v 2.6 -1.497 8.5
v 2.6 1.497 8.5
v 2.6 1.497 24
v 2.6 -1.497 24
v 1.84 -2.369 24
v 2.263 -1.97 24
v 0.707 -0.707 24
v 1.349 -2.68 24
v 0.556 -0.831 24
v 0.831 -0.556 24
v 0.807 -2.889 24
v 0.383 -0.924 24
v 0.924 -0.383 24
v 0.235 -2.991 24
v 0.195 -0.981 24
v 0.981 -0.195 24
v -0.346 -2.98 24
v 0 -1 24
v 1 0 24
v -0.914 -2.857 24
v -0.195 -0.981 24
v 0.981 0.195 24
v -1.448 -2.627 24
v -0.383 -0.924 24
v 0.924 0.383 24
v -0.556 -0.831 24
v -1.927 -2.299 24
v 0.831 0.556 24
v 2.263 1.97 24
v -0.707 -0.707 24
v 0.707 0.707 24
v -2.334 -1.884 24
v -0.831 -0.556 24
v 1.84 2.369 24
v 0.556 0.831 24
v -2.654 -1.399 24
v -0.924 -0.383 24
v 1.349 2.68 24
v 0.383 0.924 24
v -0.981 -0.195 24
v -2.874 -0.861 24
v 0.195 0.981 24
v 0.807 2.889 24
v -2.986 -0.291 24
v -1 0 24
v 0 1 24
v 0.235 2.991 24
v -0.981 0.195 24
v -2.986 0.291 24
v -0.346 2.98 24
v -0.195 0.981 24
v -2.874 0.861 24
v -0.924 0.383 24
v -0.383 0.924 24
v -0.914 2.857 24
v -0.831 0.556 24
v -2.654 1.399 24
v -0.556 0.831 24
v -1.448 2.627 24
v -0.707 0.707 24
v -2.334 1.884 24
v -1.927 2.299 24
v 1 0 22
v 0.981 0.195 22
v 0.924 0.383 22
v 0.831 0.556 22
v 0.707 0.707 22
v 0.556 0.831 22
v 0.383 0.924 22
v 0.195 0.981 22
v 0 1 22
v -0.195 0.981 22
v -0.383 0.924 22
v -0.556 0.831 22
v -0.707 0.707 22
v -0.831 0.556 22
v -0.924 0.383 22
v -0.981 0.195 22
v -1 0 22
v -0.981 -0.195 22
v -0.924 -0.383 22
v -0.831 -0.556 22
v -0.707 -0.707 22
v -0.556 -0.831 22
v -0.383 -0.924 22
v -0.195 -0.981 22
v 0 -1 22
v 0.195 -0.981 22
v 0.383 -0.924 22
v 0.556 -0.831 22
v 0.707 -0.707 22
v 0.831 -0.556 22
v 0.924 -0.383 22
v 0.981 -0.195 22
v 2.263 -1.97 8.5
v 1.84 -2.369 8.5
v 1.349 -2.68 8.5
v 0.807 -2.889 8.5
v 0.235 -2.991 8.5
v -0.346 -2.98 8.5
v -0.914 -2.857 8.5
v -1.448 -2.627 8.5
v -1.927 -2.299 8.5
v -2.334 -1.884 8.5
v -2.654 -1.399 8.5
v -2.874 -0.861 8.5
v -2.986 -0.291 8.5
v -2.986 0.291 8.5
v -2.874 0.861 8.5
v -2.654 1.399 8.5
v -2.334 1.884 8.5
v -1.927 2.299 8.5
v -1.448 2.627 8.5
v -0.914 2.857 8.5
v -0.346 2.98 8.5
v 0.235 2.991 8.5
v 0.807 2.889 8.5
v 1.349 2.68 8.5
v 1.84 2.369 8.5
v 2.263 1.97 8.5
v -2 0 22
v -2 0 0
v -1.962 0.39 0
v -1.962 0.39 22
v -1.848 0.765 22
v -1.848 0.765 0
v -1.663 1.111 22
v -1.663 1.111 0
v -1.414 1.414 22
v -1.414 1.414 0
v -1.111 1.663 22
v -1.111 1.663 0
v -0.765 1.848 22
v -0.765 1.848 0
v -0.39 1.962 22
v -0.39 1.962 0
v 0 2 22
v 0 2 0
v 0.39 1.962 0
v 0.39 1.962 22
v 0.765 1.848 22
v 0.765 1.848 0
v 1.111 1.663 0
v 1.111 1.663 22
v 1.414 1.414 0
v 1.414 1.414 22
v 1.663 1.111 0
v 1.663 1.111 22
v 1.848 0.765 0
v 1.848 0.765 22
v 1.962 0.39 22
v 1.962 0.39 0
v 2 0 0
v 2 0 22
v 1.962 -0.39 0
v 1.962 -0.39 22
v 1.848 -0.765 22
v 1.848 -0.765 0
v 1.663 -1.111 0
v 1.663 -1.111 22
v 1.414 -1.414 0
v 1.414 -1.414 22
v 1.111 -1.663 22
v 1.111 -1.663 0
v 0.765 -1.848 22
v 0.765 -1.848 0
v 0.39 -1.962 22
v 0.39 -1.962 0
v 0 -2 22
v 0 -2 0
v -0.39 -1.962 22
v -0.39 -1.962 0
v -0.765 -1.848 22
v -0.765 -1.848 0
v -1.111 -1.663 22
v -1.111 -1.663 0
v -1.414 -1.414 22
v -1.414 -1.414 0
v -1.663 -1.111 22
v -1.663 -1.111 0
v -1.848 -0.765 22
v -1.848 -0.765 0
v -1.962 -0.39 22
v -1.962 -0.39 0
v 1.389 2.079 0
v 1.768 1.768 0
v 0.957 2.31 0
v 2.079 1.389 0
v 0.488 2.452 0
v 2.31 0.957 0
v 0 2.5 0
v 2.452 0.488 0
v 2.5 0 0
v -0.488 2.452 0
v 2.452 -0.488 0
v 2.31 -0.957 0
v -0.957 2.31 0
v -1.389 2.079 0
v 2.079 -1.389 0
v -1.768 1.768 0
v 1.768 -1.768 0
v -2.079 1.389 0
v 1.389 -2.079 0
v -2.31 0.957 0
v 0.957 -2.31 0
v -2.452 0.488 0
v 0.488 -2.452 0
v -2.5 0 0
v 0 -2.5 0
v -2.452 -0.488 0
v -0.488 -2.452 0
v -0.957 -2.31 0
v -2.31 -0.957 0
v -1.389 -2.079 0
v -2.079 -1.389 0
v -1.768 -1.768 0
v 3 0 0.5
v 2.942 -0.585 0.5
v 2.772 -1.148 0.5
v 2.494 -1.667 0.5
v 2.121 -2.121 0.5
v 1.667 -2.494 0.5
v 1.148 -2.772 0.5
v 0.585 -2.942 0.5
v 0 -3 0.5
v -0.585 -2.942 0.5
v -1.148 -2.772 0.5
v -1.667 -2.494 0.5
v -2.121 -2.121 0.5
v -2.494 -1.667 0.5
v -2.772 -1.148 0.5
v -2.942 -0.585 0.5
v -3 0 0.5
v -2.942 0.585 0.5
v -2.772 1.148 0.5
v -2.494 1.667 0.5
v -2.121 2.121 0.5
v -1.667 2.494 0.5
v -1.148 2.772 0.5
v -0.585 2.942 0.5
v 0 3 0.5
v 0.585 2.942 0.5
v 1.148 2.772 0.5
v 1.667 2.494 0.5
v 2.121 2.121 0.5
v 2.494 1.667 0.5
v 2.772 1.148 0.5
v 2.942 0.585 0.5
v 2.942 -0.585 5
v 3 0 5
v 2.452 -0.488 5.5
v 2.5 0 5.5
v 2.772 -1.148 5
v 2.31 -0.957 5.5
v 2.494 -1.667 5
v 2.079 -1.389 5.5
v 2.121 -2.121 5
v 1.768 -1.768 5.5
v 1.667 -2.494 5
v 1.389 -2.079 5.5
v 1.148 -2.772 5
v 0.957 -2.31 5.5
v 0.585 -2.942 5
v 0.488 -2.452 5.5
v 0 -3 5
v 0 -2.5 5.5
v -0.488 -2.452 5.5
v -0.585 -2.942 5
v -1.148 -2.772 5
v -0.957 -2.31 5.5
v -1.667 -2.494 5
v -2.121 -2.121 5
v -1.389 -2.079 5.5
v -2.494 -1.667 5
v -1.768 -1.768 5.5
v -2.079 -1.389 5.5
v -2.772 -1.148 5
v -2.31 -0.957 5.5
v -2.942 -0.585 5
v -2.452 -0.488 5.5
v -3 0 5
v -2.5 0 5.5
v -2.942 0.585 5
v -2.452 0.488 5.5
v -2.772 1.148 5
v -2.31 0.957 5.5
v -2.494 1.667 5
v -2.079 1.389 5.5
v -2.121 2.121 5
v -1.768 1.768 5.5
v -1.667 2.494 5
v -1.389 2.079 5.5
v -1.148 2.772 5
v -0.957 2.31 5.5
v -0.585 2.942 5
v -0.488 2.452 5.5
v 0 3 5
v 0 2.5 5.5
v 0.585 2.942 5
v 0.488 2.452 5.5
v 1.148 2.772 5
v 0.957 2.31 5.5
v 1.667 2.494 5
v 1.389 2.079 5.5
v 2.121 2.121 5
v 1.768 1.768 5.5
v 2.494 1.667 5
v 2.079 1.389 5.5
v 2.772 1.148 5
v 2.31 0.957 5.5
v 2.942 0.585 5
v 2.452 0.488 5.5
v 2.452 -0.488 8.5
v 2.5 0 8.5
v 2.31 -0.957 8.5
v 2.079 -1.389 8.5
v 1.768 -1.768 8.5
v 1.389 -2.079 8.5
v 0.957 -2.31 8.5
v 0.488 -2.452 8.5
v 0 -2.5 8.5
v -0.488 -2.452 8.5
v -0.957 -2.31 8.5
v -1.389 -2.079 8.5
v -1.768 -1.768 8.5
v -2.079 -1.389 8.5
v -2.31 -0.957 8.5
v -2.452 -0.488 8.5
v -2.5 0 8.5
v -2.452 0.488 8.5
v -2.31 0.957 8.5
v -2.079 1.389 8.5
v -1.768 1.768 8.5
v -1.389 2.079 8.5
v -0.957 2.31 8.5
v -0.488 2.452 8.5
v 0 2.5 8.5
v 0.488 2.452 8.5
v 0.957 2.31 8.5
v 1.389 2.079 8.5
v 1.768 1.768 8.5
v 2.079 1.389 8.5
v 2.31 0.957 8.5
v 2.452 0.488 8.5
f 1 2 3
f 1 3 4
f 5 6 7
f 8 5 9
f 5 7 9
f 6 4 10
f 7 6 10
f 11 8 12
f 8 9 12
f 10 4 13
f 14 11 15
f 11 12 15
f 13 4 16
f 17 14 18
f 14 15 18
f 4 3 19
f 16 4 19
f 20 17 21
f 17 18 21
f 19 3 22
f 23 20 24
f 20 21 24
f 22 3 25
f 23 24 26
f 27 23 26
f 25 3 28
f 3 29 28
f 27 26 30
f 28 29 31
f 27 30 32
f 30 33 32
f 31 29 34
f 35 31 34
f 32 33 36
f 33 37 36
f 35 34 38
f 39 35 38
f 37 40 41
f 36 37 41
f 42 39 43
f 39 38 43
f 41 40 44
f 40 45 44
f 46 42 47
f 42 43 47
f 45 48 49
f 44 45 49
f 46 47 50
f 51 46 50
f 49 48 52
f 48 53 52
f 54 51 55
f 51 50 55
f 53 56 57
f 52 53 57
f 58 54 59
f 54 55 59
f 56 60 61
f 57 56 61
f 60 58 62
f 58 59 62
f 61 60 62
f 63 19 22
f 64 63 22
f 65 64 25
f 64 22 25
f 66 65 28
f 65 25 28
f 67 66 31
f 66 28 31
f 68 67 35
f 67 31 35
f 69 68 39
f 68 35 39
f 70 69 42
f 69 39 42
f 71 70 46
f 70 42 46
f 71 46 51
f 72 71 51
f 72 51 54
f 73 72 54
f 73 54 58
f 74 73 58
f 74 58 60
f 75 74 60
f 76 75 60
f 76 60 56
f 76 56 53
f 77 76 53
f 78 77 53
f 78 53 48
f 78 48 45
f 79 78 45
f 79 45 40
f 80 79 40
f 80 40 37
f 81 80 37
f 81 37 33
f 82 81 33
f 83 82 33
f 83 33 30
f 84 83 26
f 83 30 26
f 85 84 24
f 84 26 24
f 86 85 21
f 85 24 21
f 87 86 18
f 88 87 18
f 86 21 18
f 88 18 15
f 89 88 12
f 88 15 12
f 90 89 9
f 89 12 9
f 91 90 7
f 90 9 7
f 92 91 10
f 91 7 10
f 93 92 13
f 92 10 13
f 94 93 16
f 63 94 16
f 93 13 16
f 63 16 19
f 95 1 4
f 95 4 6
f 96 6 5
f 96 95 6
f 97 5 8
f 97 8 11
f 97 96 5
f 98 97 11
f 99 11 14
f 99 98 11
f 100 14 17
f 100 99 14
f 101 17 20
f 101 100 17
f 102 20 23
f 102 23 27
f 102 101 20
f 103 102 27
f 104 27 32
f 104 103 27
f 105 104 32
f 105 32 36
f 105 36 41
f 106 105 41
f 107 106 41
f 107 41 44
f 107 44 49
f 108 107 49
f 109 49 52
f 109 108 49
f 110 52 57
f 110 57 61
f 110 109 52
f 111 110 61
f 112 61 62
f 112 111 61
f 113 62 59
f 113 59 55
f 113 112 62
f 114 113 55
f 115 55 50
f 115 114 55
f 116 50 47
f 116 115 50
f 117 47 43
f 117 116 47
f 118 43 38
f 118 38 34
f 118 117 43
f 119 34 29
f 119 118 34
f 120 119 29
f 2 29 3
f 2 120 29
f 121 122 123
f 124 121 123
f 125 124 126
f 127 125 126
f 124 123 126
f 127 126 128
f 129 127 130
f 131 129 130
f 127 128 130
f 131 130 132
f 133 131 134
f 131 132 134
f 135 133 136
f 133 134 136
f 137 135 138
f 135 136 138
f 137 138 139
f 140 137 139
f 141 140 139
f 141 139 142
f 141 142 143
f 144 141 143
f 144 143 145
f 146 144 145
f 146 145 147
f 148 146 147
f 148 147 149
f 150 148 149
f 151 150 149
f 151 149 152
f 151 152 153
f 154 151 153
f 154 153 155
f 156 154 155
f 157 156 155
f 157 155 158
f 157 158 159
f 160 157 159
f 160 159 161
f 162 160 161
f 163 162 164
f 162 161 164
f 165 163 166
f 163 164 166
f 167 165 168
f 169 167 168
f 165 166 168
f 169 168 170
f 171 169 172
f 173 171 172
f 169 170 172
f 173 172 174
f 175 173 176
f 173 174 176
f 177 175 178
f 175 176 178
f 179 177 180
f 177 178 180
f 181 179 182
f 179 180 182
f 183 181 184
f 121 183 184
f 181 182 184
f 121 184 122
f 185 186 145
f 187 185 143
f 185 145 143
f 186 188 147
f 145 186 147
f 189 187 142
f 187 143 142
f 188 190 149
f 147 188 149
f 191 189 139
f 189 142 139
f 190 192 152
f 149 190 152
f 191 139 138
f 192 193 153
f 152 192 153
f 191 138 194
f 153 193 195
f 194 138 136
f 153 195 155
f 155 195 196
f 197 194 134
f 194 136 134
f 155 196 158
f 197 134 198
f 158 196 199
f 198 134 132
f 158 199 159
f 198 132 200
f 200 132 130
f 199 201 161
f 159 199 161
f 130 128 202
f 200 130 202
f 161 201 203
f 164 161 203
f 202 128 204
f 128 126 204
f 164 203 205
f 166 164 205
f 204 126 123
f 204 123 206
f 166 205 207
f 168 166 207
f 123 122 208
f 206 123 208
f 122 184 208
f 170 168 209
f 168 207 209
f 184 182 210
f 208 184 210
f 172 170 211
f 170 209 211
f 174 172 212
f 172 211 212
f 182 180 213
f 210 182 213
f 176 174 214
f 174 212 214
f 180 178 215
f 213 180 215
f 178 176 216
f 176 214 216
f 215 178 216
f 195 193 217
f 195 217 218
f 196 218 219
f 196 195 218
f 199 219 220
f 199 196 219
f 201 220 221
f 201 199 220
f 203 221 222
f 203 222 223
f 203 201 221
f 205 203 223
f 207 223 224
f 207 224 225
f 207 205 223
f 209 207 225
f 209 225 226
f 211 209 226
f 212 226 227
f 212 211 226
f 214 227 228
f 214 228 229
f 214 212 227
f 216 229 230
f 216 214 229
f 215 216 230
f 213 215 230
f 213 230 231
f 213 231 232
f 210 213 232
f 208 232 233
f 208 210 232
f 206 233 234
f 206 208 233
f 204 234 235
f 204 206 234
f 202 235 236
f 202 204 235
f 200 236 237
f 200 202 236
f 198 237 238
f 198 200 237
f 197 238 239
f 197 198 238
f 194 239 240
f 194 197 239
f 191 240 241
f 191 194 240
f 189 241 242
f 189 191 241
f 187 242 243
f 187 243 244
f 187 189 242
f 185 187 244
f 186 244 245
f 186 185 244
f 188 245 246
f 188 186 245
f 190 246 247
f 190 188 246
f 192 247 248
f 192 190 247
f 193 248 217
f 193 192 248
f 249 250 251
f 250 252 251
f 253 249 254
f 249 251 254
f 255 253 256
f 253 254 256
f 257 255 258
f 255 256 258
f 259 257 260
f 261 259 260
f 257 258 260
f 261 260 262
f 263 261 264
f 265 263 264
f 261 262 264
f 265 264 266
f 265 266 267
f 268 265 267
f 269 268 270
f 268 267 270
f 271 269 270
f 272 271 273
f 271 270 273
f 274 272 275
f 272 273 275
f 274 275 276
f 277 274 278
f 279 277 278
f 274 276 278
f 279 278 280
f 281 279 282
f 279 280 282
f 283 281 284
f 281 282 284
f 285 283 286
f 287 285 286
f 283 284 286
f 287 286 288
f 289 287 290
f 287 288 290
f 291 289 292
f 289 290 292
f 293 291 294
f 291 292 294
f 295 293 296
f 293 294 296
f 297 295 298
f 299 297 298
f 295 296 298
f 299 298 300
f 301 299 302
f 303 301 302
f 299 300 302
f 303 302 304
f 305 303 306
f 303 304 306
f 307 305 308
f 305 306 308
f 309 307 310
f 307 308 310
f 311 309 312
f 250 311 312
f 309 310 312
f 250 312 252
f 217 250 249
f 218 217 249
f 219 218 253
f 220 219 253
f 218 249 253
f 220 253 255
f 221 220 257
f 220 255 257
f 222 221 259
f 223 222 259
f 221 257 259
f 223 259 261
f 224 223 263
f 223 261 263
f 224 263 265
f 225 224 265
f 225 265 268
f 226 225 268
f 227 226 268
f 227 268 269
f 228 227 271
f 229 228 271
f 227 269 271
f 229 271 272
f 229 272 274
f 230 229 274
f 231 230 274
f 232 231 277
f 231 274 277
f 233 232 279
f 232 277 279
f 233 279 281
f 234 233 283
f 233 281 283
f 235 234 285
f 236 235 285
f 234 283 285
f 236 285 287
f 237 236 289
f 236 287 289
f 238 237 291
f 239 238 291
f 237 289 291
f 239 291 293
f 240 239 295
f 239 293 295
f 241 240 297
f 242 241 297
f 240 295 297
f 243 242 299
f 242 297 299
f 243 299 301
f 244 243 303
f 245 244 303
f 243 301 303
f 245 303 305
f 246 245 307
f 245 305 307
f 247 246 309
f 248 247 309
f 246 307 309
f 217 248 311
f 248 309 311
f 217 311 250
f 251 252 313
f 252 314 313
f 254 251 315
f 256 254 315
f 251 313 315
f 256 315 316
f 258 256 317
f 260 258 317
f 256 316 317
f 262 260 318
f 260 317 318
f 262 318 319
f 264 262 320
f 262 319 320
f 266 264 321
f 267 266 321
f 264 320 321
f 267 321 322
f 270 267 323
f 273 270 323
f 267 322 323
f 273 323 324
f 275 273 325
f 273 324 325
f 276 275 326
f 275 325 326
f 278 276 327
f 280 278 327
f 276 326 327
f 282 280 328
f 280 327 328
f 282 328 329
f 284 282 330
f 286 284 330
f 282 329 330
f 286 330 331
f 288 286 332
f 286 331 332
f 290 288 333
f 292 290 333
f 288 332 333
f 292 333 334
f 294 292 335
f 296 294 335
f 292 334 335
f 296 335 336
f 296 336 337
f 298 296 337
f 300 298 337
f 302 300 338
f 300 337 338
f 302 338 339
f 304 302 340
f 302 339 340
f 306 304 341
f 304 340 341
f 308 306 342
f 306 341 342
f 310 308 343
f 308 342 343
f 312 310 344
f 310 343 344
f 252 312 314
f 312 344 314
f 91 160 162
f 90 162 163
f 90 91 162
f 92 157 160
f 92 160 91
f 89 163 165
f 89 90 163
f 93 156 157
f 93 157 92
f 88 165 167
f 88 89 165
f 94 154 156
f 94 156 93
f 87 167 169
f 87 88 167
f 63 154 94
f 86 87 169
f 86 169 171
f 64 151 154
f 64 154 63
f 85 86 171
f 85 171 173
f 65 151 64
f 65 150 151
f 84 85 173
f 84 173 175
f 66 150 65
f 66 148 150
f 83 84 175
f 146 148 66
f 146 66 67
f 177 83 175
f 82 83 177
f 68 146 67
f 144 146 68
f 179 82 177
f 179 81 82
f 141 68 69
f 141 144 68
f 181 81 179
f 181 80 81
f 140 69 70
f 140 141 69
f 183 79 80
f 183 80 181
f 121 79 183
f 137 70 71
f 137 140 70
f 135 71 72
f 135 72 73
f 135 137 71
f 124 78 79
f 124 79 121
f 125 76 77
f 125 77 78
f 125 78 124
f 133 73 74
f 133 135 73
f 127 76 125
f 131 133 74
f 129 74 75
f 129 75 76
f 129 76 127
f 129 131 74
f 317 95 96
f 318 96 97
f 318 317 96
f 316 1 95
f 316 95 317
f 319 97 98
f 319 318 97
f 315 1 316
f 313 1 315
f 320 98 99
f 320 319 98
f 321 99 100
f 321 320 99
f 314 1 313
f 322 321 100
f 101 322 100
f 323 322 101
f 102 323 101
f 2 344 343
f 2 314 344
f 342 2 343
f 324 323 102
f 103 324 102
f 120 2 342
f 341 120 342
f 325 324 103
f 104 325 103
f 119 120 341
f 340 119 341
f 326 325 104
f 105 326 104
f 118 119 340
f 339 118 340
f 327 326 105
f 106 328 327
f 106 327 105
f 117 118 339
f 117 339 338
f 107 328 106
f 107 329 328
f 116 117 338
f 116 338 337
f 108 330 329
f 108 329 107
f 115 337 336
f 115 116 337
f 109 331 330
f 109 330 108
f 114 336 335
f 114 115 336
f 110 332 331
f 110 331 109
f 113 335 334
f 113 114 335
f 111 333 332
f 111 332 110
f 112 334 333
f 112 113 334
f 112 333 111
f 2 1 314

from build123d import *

# Parameters (mm, degrees)
BOSS_EXTRUDE1_DEPTH                                 = 15.5
CBORE_FOR_1_BINDING_HEAD_MACHINE_SCREW1_D           = 2
CBORE_FOR_1_BINDING_HEAD_MACHINE_SCREW1_DEPTH       = 24
CBORE_FOR_1_BINDING_HEAD_MACHINE_SCREW1_CBORE_D     = 4
CBORE_FOR_1_BINDING_HEAD_MACHINE_SCREW1_CBORE_DEPTH = 22
CHAMFER1_SIZE                                       = 0.5


with BuildPart() as part:
    # Sketch1 → Boss-Extrude1 (new body)
    with BuildSketch(Plane(origin=(0, 0, 8.5), x_dir=(-1, 0, 0), z_dir=(0, 0, -1))):
        with BuildLine():
            Line((-2.6, 1.496662955), (-2.6, -1.496662955))
            ThreePointArc((-2.6, -1.496662955), (3, 0), (-2.6, 1.496662955))
        make_face()
    extrude(amount=-BOSS_EXTRUDE1_DEPTH)

    # Sketch2 → Revolve1 (revolve)
    with BuildSketch(Plane.XZ):
        Polygon((2.5, 8.5), (0, 8.5), (0, 0), (3, 0), (3, 5), (2.5, 5.5), align=None)
    revolve(axis=Axis((0, 0, 8.5), (0, 0, -1)))

    # CBORE for #1 Binding Head Machine Screw1
    with Locations(Plane(origin=(0, 0, 0), x_dir=(-1, 0, 0), z_dir=(0, 0, -1))):
        with Locations((0, 0)):
            CounterBoreHole(CBORE_FOR_1_BINDING_HEAD_MACHINE_SCREW1_D / 2, CBORE_FOR_1_BINDING_HEAD_MACHINE_SCREW1_CBORE_D / 2, CBORE_FOR_1_BINDING_HEAD_MACHINE_SCREW1_CBORE_DEPTH, depth=CBORE_FOR_1_BINDING_HEAD_MACHINE_SCREW1_DEPTH)

    # Chamfer1
    chamfer1_edges = [part.edges().sort_by_distance(p)[0] for p in [
        (-3, 0, 0),
    ]]
    chamfer(chamfer1_edges, length=CHAMFER1_SIZE)


solid = part.part
